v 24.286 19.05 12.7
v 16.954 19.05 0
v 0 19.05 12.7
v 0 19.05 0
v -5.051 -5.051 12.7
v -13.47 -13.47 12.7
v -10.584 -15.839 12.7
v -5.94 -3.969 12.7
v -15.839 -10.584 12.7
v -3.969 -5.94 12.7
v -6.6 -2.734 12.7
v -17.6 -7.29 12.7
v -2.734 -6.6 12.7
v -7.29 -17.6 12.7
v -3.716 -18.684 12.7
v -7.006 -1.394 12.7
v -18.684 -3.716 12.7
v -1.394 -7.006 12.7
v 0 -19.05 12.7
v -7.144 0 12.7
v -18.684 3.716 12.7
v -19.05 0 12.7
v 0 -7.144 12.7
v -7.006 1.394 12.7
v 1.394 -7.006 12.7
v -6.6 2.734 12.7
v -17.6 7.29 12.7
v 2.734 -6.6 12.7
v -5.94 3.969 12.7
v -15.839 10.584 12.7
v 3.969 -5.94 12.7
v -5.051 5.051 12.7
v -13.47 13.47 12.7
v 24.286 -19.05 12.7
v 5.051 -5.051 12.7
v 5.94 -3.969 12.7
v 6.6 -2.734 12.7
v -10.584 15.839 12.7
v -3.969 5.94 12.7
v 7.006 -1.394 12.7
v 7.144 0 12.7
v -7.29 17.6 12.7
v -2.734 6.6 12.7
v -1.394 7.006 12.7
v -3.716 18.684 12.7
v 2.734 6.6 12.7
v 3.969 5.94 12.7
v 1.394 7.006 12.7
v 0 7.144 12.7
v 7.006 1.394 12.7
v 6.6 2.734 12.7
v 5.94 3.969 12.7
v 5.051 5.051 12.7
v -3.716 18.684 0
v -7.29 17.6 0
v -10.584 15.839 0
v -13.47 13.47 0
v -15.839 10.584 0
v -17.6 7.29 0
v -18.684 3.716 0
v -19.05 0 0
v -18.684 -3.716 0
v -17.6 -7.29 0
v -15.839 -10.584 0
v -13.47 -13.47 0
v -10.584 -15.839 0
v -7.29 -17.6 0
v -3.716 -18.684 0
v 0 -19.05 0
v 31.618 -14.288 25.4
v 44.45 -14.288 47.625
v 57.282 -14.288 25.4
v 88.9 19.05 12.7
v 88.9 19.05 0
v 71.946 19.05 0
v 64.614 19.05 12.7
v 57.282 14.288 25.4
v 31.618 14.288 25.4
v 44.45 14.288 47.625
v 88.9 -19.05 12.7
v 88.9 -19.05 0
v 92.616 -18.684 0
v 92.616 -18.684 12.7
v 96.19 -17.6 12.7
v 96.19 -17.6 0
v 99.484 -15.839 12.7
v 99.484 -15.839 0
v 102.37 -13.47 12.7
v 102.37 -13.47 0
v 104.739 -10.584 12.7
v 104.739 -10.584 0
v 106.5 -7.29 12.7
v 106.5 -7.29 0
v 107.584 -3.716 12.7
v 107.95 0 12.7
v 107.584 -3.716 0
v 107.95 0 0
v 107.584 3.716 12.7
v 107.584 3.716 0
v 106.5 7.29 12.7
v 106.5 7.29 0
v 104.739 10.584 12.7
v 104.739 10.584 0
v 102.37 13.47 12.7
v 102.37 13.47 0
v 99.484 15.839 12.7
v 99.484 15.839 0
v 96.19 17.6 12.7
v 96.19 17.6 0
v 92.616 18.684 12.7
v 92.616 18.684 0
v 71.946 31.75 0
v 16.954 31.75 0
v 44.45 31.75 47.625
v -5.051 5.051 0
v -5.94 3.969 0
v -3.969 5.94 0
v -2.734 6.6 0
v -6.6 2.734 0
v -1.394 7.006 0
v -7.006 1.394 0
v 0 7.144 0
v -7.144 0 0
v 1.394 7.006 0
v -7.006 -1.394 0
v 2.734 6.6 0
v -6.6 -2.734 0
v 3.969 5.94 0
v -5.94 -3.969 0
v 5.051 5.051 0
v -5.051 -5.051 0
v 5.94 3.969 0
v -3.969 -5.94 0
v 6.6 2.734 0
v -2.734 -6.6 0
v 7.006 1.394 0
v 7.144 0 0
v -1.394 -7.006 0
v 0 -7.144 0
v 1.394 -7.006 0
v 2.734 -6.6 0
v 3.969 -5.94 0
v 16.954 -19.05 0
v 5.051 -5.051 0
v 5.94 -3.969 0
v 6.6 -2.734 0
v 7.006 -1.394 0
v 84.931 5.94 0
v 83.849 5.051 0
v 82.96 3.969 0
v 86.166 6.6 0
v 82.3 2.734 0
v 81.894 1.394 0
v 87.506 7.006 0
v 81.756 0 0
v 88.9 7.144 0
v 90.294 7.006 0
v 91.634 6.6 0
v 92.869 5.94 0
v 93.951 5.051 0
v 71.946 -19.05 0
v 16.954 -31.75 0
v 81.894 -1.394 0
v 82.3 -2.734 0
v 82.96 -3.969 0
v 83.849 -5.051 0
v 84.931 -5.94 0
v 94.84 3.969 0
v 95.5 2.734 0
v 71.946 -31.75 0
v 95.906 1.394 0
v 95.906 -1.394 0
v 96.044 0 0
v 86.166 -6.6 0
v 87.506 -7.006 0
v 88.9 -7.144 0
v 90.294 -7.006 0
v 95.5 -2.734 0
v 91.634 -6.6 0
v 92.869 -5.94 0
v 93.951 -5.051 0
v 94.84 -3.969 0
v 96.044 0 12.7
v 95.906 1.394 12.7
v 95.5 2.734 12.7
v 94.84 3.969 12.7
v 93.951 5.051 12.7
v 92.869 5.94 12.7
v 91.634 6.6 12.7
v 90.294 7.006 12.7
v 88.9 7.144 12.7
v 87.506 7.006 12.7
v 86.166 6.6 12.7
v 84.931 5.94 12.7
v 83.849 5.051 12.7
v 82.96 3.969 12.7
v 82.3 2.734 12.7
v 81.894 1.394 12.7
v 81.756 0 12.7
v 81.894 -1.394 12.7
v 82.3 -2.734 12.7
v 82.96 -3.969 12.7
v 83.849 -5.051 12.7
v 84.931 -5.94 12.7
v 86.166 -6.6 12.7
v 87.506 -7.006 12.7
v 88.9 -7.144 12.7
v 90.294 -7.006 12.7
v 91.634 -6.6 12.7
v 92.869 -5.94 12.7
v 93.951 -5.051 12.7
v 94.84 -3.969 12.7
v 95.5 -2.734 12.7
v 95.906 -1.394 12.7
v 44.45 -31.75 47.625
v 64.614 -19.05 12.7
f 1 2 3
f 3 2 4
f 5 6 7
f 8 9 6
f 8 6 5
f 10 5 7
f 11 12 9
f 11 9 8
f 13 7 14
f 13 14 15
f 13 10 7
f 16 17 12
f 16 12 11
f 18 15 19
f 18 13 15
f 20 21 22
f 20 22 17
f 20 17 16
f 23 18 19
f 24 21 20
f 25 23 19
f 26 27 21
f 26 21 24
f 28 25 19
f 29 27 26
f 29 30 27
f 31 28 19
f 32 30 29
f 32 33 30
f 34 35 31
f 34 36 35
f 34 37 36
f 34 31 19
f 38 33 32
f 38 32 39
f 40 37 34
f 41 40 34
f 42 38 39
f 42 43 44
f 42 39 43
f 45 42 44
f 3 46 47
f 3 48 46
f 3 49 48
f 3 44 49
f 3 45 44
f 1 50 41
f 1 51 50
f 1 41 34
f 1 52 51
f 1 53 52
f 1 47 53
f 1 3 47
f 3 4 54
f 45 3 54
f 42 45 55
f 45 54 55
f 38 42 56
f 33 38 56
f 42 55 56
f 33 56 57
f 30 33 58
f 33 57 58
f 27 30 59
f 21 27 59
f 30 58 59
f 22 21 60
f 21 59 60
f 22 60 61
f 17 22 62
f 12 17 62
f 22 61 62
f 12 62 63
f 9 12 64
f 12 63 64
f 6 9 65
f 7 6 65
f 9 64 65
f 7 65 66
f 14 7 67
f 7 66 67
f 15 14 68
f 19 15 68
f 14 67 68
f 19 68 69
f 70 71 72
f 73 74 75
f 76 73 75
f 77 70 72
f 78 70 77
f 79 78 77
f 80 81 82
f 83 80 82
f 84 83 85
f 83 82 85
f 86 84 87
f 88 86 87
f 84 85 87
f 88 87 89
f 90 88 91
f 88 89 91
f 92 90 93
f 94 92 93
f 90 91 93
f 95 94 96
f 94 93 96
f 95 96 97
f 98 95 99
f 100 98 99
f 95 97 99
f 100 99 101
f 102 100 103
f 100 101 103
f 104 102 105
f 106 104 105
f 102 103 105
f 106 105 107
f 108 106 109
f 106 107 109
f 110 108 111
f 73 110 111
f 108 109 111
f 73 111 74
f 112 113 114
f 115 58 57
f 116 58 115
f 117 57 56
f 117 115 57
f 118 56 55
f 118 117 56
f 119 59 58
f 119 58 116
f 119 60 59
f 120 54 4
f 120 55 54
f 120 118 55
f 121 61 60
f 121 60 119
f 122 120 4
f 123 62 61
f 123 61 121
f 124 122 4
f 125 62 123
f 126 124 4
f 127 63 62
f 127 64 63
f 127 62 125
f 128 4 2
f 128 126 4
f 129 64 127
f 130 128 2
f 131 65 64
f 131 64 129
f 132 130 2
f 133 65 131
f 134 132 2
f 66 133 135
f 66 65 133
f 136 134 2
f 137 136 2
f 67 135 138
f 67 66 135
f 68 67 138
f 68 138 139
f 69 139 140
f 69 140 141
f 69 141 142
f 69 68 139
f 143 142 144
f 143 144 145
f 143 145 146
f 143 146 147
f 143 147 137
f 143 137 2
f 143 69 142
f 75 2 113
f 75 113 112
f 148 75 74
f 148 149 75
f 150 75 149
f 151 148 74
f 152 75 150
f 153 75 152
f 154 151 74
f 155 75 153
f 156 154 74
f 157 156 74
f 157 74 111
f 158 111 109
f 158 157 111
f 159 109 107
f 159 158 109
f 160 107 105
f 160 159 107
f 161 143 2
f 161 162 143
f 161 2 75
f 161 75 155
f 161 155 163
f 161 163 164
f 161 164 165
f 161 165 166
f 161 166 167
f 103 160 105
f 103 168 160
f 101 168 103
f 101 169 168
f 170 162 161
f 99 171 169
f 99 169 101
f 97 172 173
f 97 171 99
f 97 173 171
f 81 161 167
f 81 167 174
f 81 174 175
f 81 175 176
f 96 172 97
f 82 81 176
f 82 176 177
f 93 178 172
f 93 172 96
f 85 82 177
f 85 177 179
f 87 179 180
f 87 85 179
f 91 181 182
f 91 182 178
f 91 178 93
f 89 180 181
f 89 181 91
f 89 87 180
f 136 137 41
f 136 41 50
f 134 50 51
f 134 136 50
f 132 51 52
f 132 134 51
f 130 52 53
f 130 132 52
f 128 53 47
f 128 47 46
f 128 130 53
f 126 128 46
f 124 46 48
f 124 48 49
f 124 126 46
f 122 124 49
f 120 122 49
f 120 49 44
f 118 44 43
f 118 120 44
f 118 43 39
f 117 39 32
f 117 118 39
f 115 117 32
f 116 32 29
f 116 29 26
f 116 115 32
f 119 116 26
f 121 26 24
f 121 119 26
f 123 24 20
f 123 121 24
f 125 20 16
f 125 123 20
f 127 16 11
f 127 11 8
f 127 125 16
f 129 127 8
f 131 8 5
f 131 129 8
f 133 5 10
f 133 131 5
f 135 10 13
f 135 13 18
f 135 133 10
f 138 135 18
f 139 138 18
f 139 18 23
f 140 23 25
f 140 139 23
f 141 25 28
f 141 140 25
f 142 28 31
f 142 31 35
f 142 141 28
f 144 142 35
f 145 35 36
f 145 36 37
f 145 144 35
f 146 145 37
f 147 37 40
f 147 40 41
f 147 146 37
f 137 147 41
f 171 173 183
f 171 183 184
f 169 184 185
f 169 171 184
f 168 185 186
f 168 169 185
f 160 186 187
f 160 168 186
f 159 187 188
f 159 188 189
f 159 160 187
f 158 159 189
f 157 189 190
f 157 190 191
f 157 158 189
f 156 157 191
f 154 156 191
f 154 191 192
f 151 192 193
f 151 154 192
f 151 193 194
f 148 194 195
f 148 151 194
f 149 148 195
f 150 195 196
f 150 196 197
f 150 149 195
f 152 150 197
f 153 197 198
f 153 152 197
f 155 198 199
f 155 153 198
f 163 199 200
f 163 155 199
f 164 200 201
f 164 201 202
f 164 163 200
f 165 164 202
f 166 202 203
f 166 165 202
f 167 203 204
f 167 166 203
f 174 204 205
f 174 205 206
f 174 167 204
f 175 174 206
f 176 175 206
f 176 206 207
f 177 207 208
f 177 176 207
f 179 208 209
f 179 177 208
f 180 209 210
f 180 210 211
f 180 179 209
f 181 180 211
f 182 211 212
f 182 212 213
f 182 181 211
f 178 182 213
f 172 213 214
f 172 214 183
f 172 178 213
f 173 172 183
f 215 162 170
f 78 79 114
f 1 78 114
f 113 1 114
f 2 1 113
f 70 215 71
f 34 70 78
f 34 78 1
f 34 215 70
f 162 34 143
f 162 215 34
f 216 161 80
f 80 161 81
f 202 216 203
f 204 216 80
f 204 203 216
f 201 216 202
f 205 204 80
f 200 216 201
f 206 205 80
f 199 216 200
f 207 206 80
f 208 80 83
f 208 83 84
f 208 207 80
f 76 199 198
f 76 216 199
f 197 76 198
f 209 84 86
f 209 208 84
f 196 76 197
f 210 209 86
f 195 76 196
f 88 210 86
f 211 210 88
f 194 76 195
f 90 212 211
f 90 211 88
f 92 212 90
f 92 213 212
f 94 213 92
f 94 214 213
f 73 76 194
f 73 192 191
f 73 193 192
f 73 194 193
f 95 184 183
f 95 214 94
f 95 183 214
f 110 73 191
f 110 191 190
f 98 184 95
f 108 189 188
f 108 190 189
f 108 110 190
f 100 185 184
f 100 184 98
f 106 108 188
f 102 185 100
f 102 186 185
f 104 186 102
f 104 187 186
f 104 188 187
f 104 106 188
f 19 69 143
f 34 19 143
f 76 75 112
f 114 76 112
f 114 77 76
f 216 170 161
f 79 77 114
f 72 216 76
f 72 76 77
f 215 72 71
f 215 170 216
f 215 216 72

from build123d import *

# Parameters (mm, degrees)
F0_R     = 7.14375
F1_DEPTH = 12.7
F3_DEPTH = 31.75
F5_DEPTH = 107.951


with BuildPart() as f1:
    # F0 (on Top) → F1 (new body)
    with BuildSketch(Plane.XY):
        with BuildLine():
            Line((0, -19.05), (88.9, -19.05))
            ThreePointArc((88.9, -19.05), (107.95, 0), (88.9, 19.05))
            Line((88.9, 19.05), (0, 19.05))
            ThreePointArc((0, 19.05), (-19.05, 0), (0, -19.05))
        make_face()
        Circle(F0_R, mode=Mode.SUBTRACT)
        with Locations((88.9, 0)):
            Circle(F0_R, mode=Mode.SUBTRACT)
    extrude(amount=F1_DEPTH)

    # F2 (on Front) → F3 (join, symmetric)
    with BuildSketch(Plane.XZ):
        Polygon((44.45, 47.625), (16.953693, 0), (44.45, 0), align=None)
        Polygon((44.45, 47.625), (44.45, 0), (71.946307, 0), align=None)
    extrude(amount=F3_DEPTH, both=True)

    # F4 (on Right) → F5 (cut, through all)
    with BuildSketch(Plane.YZ):
        Polygon((-14.2875, 25.4), (0, 25.4), (14.2875, 25.4), (14.2875, 47.625), (-14.2875, 47.625), align=None)
    extrude(amount=F5_DEPTH, mode=Mode.SUBTRACT)


solid = f1.part
